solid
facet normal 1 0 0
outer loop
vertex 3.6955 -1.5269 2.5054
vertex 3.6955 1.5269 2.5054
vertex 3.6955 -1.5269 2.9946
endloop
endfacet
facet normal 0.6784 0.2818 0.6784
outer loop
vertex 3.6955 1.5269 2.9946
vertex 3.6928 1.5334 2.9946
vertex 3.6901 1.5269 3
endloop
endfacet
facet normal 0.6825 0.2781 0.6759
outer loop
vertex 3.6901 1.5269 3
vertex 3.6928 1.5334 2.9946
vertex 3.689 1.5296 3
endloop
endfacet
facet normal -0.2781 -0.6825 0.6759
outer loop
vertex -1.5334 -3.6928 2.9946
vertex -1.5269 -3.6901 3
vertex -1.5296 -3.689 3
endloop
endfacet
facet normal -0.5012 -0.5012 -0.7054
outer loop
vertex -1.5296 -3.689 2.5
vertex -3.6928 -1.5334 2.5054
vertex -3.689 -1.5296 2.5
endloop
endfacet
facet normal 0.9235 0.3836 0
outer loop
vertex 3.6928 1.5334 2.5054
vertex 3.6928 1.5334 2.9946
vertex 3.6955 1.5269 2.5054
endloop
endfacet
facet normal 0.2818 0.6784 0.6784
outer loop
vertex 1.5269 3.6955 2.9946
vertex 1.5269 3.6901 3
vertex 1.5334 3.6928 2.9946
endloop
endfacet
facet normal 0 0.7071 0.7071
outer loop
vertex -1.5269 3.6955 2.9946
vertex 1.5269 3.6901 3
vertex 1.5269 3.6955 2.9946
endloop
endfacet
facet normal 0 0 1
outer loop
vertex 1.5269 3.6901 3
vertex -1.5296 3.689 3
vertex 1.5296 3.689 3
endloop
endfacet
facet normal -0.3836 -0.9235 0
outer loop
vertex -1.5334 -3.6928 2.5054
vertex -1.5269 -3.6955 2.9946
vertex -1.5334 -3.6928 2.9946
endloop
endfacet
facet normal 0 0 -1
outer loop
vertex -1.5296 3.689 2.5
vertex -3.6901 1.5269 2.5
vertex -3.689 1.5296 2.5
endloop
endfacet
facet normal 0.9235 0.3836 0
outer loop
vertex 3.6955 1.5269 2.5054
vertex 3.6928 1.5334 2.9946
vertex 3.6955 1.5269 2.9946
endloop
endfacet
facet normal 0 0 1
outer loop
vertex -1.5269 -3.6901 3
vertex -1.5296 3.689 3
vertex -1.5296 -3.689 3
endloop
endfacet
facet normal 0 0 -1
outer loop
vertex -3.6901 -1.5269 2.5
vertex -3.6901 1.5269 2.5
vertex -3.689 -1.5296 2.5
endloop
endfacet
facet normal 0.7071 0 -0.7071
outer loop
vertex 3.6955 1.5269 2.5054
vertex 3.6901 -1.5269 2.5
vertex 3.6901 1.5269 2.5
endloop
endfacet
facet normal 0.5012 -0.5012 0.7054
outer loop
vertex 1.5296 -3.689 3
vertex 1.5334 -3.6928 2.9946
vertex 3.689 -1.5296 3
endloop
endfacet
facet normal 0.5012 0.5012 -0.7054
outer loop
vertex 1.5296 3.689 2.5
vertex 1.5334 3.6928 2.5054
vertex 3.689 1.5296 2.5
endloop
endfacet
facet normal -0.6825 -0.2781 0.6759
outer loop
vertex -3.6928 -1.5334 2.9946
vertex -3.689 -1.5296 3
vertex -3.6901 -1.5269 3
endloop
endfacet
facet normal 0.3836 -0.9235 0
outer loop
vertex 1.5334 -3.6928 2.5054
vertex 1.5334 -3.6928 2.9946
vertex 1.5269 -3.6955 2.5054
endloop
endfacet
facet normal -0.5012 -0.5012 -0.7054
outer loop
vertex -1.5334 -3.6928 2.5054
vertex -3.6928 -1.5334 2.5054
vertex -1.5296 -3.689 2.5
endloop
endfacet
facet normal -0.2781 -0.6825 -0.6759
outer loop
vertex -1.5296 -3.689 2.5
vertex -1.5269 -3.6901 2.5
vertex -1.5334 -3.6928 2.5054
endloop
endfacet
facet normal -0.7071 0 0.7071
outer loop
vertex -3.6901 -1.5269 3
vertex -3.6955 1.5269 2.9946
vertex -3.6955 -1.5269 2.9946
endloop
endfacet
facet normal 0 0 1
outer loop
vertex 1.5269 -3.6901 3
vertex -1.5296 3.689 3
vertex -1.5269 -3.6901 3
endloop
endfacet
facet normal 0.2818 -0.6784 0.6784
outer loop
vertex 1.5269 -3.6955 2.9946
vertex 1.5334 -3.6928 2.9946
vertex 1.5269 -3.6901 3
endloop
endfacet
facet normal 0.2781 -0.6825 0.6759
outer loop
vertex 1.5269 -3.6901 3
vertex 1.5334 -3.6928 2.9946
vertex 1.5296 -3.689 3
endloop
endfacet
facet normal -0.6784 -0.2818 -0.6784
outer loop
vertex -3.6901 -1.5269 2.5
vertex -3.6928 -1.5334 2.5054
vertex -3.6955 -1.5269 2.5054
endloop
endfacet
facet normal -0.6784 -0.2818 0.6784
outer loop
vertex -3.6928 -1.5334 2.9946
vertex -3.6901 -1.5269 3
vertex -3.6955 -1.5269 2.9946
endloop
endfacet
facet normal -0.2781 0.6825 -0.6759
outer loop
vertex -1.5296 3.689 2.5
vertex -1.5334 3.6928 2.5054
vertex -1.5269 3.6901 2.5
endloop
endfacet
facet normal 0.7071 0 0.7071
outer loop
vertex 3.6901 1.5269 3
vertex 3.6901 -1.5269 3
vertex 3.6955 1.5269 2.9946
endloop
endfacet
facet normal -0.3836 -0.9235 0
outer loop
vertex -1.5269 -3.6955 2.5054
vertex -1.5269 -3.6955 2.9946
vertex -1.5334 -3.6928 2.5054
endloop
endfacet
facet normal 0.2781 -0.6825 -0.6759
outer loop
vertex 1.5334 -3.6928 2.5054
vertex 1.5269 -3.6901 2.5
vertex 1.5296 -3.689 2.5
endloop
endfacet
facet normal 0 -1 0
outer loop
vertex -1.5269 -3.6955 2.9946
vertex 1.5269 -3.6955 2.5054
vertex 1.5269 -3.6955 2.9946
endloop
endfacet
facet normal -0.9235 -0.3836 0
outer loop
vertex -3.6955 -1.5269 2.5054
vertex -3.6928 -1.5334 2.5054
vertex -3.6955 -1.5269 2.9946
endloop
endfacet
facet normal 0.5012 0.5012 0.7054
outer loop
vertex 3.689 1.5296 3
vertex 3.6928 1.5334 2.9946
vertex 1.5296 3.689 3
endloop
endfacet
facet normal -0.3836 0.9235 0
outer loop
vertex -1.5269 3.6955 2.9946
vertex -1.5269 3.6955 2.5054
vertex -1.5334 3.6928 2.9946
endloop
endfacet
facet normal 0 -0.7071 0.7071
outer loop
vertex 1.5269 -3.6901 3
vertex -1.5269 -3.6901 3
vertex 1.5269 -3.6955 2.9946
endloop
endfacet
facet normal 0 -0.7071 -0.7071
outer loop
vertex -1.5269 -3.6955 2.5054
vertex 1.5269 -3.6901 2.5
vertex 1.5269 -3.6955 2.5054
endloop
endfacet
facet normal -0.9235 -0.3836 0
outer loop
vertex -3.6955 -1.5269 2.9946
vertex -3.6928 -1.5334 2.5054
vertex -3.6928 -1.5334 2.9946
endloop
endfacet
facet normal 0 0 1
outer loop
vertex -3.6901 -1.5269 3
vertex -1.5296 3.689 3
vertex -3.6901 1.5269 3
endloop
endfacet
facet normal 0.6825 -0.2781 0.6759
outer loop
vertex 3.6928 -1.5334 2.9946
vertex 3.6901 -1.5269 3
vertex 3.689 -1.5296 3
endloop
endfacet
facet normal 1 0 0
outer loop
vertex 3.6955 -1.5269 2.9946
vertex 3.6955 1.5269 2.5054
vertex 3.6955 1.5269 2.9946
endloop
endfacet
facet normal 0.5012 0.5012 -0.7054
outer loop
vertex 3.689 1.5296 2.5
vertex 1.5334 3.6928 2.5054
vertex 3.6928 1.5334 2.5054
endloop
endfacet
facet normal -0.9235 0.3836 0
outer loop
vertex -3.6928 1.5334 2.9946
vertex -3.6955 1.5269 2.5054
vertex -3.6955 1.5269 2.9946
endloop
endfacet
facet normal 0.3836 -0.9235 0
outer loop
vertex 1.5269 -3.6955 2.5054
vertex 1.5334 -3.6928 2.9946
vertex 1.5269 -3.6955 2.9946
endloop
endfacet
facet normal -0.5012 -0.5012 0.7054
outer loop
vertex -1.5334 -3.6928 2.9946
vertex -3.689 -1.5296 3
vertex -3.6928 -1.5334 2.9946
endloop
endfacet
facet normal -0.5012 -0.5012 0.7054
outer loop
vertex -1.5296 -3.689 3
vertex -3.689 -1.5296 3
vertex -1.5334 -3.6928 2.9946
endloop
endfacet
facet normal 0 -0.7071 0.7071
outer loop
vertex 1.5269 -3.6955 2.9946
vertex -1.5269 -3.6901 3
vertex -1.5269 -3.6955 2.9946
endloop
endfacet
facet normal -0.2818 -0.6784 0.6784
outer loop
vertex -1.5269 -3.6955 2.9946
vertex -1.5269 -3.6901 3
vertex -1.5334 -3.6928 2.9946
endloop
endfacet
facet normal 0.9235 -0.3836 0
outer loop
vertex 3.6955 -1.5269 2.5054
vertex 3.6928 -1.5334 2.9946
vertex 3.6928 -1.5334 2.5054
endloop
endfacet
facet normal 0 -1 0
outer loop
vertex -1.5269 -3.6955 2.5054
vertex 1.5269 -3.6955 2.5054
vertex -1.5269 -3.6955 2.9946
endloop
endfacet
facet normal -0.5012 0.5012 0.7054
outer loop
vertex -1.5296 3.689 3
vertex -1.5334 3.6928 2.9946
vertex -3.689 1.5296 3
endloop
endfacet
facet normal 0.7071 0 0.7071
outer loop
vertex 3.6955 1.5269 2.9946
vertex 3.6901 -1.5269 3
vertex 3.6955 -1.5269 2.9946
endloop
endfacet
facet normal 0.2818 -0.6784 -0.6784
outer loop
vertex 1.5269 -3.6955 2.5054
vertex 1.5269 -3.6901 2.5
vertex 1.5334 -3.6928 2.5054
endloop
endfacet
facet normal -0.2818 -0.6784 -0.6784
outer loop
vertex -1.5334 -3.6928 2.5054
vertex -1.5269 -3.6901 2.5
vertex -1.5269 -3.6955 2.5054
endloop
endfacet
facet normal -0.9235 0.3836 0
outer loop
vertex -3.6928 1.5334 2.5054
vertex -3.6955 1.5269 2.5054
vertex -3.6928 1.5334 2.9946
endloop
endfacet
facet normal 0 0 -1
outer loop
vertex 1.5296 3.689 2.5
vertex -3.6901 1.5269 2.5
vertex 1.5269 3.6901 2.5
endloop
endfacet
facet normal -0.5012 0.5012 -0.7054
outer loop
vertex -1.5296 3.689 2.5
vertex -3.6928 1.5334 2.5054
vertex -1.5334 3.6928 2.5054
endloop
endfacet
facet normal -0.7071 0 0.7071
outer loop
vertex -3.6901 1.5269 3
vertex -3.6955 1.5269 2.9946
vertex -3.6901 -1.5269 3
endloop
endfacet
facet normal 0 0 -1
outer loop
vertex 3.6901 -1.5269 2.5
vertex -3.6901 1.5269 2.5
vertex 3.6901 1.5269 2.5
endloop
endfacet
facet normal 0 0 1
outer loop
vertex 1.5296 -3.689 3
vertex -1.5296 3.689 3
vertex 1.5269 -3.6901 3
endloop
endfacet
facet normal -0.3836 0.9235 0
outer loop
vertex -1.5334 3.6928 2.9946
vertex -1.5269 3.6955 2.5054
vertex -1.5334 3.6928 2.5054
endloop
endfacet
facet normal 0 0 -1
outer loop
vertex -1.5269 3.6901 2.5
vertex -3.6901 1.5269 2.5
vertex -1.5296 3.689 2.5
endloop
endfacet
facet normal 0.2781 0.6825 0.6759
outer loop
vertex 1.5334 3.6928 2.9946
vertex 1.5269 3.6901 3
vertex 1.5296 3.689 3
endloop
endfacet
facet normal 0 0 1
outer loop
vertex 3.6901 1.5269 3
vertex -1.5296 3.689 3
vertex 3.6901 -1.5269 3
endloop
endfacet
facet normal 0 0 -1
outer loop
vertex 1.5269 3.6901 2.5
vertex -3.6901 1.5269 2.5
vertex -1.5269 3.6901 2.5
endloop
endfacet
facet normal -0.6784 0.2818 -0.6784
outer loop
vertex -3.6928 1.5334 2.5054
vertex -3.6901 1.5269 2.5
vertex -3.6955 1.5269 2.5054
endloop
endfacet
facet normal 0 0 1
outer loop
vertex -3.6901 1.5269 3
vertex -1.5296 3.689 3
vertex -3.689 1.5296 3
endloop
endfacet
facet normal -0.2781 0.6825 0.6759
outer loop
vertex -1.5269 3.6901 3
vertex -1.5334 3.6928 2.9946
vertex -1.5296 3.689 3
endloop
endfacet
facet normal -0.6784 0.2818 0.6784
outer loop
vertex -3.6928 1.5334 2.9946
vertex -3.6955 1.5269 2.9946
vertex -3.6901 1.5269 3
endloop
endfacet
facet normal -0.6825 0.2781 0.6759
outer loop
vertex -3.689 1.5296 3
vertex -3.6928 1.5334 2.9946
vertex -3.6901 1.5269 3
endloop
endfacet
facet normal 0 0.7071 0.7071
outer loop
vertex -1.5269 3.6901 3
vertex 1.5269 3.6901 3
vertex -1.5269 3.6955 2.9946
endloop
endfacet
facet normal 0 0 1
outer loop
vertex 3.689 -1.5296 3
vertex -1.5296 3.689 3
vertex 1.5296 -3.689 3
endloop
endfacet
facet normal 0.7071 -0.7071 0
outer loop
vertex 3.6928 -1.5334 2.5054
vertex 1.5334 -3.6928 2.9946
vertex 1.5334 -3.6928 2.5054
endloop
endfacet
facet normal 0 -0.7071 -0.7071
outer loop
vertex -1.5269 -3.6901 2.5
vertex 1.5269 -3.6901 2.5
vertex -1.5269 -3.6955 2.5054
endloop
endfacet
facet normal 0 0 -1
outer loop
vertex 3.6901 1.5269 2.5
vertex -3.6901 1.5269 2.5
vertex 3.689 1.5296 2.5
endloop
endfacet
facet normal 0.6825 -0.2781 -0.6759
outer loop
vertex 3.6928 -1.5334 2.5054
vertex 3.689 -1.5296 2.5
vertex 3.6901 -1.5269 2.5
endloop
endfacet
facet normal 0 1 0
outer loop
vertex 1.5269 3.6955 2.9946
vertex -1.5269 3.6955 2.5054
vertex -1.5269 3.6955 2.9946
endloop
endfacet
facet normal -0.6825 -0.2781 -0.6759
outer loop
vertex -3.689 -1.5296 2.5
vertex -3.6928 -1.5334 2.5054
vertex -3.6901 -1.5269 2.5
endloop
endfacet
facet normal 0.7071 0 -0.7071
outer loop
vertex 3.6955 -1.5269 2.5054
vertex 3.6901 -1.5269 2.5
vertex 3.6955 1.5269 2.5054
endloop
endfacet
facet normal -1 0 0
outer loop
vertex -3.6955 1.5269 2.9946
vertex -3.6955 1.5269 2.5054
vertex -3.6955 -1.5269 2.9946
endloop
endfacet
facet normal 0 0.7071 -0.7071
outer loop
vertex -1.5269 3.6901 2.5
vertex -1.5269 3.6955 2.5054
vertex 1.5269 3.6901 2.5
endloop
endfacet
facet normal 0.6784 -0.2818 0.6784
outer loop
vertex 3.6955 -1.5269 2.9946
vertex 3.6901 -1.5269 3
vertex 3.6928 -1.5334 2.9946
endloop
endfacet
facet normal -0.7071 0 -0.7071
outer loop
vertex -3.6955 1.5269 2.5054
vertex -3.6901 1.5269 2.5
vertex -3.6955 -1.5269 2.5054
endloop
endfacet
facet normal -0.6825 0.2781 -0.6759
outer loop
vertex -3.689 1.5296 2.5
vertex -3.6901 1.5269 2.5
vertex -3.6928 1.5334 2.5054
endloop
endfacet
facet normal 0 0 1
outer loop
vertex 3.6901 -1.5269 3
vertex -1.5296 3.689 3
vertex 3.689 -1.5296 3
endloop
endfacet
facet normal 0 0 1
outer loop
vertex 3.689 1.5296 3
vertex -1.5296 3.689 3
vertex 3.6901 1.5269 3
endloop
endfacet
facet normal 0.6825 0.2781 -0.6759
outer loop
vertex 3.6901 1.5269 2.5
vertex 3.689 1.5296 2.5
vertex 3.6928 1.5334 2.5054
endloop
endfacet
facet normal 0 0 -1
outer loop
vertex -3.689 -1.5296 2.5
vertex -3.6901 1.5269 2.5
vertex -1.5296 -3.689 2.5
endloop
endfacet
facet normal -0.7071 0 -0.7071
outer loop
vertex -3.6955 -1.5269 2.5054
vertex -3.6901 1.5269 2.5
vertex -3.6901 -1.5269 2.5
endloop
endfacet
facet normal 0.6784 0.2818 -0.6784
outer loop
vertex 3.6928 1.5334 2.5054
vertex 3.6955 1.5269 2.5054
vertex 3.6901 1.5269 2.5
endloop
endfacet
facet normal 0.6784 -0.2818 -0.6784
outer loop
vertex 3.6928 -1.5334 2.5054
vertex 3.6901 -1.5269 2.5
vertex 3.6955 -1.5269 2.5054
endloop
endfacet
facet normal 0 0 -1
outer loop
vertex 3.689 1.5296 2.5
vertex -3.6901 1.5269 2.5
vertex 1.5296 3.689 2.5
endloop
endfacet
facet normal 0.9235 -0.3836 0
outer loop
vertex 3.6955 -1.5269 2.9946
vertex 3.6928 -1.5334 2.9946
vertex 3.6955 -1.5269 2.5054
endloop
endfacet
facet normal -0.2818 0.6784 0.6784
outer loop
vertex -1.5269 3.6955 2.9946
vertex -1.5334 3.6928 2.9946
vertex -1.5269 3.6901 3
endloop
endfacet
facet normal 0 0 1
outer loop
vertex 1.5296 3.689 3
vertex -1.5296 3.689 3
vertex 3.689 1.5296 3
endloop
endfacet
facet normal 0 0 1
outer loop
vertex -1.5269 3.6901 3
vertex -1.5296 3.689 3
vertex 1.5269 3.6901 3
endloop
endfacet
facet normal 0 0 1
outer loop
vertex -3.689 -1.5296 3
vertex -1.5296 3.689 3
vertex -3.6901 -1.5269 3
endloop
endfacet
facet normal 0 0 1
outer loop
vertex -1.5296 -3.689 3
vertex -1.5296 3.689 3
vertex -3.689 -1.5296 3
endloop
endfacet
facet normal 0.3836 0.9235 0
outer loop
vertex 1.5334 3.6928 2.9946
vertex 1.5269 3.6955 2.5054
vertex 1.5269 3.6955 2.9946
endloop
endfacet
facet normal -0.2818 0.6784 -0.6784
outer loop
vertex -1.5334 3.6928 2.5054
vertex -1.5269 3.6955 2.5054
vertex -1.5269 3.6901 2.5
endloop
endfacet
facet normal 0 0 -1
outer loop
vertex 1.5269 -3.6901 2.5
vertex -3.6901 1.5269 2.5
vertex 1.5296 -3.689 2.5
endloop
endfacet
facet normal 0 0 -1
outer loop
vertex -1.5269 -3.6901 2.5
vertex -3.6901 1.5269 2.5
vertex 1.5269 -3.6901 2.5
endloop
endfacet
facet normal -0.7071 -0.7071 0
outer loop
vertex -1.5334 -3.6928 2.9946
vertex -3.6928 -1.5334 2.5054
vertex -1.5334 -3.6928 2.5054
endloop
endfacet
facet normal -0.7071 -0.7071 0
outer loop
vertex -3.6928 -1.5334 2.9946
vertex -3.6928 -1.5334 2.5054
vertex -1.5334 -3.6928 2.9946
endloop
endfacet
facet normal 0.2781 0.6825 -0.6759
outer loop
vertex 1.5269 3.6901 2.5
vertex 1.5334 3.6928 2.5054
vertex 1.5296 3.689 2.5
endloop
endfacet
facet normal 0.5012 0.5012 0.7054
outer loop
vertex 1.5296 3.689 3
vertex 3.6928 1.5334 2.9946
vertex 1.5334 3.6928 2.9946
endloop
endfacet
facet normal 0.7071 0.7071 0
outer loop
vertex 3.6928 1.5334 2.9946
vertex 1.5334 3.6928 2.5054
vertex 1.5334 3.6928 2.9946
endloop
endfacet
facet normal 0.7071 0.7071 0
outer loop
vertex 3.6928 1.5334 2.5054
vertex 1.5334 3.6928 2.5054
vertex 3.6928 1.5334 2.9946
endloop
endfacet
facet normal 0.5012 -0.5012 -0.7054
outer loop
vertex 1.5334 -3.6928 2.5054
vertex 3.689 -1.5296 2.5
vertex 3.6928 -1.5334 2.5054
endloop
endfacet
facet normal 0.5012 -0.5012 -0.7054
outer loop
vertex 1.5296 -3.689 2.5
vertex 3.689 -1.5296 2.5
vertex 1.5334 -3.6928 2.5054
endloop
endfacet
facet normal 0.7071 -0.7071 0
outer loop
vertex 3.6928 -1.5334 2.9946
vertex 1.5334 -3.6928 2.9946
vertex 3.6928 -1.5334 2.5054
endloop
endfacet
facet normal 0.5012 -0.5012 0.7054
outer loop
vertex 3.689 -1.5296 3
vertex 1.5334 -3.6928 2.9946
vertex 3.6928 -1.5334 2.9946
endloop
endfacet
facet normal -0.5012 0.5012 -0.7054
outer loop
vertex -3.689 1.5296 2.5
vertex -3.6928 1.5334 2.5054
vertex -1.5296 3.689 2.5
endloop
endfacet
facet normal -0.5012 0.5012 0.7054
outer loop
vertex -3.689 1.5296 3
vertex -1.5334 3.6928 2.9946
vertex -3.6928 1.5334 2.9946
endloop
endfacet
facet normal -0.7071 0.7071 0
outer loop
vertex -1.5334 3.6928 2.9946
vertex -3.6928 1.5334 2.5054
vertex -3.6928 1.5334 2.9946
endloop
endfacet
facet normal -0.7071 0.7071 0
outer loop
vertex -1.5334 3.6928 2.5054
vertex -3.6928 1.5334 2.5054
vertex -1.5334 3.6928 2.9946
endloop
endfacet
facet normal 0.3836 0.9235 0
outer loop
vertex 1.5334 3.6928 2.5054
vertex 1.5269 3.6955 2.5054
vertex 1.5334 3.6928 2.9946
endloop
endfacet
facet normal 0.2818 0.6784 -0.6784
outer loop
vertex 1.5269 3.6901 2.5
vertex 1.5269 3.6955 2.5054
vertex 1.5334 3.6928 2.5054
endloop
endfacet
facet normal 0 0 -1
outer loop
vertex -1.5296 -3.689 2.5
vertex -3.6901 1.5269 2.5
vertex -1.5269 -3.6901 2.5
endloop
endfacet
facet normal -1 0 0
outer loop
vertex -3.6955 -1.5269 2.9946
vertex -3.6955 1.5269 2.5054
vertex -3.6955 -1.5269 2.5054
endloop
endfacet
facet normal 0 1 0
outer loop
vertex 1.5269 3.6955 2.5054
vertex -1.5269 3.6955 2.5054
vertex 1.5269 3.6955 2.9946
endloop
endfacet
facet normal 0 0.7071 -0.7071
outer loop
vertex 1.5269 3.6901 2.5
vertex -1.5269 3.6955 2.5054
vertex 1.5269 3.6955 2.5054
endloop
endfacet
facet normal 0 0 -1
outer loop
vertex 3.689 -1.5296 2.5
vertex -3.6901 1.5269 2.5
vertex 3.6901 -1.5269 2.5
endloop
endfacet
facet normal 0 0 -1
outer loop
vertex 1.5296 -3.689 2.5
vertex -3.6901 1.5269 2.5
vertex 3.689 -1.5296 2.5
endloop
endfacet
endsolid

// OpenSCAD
use <lib.scad>

module baseLD() {
	hull() {
		translate([0,0,0.75]) intersection() {
			box([10,10,1.5]);
			rotate([0,0,45]) box([11.5,11.5,2]);
		}
		translate([0,0,2.75]) box([7,7,0.1]);
	}
}

module baseHD() {
	minkowskiOutsideRound(0.01,$fn=8)
	baseLD();
}

module padLD() {
	rotate([0,0,22.5]) translate([0,0,2.75]) cyl(4,4,0.5,$fn=8);
}

module padHD() {
	minkowskiOutsideRound(0.01,$fn=8) padLD();
}

//baseHD();
//baseLD();
padHD();
//padLD();
